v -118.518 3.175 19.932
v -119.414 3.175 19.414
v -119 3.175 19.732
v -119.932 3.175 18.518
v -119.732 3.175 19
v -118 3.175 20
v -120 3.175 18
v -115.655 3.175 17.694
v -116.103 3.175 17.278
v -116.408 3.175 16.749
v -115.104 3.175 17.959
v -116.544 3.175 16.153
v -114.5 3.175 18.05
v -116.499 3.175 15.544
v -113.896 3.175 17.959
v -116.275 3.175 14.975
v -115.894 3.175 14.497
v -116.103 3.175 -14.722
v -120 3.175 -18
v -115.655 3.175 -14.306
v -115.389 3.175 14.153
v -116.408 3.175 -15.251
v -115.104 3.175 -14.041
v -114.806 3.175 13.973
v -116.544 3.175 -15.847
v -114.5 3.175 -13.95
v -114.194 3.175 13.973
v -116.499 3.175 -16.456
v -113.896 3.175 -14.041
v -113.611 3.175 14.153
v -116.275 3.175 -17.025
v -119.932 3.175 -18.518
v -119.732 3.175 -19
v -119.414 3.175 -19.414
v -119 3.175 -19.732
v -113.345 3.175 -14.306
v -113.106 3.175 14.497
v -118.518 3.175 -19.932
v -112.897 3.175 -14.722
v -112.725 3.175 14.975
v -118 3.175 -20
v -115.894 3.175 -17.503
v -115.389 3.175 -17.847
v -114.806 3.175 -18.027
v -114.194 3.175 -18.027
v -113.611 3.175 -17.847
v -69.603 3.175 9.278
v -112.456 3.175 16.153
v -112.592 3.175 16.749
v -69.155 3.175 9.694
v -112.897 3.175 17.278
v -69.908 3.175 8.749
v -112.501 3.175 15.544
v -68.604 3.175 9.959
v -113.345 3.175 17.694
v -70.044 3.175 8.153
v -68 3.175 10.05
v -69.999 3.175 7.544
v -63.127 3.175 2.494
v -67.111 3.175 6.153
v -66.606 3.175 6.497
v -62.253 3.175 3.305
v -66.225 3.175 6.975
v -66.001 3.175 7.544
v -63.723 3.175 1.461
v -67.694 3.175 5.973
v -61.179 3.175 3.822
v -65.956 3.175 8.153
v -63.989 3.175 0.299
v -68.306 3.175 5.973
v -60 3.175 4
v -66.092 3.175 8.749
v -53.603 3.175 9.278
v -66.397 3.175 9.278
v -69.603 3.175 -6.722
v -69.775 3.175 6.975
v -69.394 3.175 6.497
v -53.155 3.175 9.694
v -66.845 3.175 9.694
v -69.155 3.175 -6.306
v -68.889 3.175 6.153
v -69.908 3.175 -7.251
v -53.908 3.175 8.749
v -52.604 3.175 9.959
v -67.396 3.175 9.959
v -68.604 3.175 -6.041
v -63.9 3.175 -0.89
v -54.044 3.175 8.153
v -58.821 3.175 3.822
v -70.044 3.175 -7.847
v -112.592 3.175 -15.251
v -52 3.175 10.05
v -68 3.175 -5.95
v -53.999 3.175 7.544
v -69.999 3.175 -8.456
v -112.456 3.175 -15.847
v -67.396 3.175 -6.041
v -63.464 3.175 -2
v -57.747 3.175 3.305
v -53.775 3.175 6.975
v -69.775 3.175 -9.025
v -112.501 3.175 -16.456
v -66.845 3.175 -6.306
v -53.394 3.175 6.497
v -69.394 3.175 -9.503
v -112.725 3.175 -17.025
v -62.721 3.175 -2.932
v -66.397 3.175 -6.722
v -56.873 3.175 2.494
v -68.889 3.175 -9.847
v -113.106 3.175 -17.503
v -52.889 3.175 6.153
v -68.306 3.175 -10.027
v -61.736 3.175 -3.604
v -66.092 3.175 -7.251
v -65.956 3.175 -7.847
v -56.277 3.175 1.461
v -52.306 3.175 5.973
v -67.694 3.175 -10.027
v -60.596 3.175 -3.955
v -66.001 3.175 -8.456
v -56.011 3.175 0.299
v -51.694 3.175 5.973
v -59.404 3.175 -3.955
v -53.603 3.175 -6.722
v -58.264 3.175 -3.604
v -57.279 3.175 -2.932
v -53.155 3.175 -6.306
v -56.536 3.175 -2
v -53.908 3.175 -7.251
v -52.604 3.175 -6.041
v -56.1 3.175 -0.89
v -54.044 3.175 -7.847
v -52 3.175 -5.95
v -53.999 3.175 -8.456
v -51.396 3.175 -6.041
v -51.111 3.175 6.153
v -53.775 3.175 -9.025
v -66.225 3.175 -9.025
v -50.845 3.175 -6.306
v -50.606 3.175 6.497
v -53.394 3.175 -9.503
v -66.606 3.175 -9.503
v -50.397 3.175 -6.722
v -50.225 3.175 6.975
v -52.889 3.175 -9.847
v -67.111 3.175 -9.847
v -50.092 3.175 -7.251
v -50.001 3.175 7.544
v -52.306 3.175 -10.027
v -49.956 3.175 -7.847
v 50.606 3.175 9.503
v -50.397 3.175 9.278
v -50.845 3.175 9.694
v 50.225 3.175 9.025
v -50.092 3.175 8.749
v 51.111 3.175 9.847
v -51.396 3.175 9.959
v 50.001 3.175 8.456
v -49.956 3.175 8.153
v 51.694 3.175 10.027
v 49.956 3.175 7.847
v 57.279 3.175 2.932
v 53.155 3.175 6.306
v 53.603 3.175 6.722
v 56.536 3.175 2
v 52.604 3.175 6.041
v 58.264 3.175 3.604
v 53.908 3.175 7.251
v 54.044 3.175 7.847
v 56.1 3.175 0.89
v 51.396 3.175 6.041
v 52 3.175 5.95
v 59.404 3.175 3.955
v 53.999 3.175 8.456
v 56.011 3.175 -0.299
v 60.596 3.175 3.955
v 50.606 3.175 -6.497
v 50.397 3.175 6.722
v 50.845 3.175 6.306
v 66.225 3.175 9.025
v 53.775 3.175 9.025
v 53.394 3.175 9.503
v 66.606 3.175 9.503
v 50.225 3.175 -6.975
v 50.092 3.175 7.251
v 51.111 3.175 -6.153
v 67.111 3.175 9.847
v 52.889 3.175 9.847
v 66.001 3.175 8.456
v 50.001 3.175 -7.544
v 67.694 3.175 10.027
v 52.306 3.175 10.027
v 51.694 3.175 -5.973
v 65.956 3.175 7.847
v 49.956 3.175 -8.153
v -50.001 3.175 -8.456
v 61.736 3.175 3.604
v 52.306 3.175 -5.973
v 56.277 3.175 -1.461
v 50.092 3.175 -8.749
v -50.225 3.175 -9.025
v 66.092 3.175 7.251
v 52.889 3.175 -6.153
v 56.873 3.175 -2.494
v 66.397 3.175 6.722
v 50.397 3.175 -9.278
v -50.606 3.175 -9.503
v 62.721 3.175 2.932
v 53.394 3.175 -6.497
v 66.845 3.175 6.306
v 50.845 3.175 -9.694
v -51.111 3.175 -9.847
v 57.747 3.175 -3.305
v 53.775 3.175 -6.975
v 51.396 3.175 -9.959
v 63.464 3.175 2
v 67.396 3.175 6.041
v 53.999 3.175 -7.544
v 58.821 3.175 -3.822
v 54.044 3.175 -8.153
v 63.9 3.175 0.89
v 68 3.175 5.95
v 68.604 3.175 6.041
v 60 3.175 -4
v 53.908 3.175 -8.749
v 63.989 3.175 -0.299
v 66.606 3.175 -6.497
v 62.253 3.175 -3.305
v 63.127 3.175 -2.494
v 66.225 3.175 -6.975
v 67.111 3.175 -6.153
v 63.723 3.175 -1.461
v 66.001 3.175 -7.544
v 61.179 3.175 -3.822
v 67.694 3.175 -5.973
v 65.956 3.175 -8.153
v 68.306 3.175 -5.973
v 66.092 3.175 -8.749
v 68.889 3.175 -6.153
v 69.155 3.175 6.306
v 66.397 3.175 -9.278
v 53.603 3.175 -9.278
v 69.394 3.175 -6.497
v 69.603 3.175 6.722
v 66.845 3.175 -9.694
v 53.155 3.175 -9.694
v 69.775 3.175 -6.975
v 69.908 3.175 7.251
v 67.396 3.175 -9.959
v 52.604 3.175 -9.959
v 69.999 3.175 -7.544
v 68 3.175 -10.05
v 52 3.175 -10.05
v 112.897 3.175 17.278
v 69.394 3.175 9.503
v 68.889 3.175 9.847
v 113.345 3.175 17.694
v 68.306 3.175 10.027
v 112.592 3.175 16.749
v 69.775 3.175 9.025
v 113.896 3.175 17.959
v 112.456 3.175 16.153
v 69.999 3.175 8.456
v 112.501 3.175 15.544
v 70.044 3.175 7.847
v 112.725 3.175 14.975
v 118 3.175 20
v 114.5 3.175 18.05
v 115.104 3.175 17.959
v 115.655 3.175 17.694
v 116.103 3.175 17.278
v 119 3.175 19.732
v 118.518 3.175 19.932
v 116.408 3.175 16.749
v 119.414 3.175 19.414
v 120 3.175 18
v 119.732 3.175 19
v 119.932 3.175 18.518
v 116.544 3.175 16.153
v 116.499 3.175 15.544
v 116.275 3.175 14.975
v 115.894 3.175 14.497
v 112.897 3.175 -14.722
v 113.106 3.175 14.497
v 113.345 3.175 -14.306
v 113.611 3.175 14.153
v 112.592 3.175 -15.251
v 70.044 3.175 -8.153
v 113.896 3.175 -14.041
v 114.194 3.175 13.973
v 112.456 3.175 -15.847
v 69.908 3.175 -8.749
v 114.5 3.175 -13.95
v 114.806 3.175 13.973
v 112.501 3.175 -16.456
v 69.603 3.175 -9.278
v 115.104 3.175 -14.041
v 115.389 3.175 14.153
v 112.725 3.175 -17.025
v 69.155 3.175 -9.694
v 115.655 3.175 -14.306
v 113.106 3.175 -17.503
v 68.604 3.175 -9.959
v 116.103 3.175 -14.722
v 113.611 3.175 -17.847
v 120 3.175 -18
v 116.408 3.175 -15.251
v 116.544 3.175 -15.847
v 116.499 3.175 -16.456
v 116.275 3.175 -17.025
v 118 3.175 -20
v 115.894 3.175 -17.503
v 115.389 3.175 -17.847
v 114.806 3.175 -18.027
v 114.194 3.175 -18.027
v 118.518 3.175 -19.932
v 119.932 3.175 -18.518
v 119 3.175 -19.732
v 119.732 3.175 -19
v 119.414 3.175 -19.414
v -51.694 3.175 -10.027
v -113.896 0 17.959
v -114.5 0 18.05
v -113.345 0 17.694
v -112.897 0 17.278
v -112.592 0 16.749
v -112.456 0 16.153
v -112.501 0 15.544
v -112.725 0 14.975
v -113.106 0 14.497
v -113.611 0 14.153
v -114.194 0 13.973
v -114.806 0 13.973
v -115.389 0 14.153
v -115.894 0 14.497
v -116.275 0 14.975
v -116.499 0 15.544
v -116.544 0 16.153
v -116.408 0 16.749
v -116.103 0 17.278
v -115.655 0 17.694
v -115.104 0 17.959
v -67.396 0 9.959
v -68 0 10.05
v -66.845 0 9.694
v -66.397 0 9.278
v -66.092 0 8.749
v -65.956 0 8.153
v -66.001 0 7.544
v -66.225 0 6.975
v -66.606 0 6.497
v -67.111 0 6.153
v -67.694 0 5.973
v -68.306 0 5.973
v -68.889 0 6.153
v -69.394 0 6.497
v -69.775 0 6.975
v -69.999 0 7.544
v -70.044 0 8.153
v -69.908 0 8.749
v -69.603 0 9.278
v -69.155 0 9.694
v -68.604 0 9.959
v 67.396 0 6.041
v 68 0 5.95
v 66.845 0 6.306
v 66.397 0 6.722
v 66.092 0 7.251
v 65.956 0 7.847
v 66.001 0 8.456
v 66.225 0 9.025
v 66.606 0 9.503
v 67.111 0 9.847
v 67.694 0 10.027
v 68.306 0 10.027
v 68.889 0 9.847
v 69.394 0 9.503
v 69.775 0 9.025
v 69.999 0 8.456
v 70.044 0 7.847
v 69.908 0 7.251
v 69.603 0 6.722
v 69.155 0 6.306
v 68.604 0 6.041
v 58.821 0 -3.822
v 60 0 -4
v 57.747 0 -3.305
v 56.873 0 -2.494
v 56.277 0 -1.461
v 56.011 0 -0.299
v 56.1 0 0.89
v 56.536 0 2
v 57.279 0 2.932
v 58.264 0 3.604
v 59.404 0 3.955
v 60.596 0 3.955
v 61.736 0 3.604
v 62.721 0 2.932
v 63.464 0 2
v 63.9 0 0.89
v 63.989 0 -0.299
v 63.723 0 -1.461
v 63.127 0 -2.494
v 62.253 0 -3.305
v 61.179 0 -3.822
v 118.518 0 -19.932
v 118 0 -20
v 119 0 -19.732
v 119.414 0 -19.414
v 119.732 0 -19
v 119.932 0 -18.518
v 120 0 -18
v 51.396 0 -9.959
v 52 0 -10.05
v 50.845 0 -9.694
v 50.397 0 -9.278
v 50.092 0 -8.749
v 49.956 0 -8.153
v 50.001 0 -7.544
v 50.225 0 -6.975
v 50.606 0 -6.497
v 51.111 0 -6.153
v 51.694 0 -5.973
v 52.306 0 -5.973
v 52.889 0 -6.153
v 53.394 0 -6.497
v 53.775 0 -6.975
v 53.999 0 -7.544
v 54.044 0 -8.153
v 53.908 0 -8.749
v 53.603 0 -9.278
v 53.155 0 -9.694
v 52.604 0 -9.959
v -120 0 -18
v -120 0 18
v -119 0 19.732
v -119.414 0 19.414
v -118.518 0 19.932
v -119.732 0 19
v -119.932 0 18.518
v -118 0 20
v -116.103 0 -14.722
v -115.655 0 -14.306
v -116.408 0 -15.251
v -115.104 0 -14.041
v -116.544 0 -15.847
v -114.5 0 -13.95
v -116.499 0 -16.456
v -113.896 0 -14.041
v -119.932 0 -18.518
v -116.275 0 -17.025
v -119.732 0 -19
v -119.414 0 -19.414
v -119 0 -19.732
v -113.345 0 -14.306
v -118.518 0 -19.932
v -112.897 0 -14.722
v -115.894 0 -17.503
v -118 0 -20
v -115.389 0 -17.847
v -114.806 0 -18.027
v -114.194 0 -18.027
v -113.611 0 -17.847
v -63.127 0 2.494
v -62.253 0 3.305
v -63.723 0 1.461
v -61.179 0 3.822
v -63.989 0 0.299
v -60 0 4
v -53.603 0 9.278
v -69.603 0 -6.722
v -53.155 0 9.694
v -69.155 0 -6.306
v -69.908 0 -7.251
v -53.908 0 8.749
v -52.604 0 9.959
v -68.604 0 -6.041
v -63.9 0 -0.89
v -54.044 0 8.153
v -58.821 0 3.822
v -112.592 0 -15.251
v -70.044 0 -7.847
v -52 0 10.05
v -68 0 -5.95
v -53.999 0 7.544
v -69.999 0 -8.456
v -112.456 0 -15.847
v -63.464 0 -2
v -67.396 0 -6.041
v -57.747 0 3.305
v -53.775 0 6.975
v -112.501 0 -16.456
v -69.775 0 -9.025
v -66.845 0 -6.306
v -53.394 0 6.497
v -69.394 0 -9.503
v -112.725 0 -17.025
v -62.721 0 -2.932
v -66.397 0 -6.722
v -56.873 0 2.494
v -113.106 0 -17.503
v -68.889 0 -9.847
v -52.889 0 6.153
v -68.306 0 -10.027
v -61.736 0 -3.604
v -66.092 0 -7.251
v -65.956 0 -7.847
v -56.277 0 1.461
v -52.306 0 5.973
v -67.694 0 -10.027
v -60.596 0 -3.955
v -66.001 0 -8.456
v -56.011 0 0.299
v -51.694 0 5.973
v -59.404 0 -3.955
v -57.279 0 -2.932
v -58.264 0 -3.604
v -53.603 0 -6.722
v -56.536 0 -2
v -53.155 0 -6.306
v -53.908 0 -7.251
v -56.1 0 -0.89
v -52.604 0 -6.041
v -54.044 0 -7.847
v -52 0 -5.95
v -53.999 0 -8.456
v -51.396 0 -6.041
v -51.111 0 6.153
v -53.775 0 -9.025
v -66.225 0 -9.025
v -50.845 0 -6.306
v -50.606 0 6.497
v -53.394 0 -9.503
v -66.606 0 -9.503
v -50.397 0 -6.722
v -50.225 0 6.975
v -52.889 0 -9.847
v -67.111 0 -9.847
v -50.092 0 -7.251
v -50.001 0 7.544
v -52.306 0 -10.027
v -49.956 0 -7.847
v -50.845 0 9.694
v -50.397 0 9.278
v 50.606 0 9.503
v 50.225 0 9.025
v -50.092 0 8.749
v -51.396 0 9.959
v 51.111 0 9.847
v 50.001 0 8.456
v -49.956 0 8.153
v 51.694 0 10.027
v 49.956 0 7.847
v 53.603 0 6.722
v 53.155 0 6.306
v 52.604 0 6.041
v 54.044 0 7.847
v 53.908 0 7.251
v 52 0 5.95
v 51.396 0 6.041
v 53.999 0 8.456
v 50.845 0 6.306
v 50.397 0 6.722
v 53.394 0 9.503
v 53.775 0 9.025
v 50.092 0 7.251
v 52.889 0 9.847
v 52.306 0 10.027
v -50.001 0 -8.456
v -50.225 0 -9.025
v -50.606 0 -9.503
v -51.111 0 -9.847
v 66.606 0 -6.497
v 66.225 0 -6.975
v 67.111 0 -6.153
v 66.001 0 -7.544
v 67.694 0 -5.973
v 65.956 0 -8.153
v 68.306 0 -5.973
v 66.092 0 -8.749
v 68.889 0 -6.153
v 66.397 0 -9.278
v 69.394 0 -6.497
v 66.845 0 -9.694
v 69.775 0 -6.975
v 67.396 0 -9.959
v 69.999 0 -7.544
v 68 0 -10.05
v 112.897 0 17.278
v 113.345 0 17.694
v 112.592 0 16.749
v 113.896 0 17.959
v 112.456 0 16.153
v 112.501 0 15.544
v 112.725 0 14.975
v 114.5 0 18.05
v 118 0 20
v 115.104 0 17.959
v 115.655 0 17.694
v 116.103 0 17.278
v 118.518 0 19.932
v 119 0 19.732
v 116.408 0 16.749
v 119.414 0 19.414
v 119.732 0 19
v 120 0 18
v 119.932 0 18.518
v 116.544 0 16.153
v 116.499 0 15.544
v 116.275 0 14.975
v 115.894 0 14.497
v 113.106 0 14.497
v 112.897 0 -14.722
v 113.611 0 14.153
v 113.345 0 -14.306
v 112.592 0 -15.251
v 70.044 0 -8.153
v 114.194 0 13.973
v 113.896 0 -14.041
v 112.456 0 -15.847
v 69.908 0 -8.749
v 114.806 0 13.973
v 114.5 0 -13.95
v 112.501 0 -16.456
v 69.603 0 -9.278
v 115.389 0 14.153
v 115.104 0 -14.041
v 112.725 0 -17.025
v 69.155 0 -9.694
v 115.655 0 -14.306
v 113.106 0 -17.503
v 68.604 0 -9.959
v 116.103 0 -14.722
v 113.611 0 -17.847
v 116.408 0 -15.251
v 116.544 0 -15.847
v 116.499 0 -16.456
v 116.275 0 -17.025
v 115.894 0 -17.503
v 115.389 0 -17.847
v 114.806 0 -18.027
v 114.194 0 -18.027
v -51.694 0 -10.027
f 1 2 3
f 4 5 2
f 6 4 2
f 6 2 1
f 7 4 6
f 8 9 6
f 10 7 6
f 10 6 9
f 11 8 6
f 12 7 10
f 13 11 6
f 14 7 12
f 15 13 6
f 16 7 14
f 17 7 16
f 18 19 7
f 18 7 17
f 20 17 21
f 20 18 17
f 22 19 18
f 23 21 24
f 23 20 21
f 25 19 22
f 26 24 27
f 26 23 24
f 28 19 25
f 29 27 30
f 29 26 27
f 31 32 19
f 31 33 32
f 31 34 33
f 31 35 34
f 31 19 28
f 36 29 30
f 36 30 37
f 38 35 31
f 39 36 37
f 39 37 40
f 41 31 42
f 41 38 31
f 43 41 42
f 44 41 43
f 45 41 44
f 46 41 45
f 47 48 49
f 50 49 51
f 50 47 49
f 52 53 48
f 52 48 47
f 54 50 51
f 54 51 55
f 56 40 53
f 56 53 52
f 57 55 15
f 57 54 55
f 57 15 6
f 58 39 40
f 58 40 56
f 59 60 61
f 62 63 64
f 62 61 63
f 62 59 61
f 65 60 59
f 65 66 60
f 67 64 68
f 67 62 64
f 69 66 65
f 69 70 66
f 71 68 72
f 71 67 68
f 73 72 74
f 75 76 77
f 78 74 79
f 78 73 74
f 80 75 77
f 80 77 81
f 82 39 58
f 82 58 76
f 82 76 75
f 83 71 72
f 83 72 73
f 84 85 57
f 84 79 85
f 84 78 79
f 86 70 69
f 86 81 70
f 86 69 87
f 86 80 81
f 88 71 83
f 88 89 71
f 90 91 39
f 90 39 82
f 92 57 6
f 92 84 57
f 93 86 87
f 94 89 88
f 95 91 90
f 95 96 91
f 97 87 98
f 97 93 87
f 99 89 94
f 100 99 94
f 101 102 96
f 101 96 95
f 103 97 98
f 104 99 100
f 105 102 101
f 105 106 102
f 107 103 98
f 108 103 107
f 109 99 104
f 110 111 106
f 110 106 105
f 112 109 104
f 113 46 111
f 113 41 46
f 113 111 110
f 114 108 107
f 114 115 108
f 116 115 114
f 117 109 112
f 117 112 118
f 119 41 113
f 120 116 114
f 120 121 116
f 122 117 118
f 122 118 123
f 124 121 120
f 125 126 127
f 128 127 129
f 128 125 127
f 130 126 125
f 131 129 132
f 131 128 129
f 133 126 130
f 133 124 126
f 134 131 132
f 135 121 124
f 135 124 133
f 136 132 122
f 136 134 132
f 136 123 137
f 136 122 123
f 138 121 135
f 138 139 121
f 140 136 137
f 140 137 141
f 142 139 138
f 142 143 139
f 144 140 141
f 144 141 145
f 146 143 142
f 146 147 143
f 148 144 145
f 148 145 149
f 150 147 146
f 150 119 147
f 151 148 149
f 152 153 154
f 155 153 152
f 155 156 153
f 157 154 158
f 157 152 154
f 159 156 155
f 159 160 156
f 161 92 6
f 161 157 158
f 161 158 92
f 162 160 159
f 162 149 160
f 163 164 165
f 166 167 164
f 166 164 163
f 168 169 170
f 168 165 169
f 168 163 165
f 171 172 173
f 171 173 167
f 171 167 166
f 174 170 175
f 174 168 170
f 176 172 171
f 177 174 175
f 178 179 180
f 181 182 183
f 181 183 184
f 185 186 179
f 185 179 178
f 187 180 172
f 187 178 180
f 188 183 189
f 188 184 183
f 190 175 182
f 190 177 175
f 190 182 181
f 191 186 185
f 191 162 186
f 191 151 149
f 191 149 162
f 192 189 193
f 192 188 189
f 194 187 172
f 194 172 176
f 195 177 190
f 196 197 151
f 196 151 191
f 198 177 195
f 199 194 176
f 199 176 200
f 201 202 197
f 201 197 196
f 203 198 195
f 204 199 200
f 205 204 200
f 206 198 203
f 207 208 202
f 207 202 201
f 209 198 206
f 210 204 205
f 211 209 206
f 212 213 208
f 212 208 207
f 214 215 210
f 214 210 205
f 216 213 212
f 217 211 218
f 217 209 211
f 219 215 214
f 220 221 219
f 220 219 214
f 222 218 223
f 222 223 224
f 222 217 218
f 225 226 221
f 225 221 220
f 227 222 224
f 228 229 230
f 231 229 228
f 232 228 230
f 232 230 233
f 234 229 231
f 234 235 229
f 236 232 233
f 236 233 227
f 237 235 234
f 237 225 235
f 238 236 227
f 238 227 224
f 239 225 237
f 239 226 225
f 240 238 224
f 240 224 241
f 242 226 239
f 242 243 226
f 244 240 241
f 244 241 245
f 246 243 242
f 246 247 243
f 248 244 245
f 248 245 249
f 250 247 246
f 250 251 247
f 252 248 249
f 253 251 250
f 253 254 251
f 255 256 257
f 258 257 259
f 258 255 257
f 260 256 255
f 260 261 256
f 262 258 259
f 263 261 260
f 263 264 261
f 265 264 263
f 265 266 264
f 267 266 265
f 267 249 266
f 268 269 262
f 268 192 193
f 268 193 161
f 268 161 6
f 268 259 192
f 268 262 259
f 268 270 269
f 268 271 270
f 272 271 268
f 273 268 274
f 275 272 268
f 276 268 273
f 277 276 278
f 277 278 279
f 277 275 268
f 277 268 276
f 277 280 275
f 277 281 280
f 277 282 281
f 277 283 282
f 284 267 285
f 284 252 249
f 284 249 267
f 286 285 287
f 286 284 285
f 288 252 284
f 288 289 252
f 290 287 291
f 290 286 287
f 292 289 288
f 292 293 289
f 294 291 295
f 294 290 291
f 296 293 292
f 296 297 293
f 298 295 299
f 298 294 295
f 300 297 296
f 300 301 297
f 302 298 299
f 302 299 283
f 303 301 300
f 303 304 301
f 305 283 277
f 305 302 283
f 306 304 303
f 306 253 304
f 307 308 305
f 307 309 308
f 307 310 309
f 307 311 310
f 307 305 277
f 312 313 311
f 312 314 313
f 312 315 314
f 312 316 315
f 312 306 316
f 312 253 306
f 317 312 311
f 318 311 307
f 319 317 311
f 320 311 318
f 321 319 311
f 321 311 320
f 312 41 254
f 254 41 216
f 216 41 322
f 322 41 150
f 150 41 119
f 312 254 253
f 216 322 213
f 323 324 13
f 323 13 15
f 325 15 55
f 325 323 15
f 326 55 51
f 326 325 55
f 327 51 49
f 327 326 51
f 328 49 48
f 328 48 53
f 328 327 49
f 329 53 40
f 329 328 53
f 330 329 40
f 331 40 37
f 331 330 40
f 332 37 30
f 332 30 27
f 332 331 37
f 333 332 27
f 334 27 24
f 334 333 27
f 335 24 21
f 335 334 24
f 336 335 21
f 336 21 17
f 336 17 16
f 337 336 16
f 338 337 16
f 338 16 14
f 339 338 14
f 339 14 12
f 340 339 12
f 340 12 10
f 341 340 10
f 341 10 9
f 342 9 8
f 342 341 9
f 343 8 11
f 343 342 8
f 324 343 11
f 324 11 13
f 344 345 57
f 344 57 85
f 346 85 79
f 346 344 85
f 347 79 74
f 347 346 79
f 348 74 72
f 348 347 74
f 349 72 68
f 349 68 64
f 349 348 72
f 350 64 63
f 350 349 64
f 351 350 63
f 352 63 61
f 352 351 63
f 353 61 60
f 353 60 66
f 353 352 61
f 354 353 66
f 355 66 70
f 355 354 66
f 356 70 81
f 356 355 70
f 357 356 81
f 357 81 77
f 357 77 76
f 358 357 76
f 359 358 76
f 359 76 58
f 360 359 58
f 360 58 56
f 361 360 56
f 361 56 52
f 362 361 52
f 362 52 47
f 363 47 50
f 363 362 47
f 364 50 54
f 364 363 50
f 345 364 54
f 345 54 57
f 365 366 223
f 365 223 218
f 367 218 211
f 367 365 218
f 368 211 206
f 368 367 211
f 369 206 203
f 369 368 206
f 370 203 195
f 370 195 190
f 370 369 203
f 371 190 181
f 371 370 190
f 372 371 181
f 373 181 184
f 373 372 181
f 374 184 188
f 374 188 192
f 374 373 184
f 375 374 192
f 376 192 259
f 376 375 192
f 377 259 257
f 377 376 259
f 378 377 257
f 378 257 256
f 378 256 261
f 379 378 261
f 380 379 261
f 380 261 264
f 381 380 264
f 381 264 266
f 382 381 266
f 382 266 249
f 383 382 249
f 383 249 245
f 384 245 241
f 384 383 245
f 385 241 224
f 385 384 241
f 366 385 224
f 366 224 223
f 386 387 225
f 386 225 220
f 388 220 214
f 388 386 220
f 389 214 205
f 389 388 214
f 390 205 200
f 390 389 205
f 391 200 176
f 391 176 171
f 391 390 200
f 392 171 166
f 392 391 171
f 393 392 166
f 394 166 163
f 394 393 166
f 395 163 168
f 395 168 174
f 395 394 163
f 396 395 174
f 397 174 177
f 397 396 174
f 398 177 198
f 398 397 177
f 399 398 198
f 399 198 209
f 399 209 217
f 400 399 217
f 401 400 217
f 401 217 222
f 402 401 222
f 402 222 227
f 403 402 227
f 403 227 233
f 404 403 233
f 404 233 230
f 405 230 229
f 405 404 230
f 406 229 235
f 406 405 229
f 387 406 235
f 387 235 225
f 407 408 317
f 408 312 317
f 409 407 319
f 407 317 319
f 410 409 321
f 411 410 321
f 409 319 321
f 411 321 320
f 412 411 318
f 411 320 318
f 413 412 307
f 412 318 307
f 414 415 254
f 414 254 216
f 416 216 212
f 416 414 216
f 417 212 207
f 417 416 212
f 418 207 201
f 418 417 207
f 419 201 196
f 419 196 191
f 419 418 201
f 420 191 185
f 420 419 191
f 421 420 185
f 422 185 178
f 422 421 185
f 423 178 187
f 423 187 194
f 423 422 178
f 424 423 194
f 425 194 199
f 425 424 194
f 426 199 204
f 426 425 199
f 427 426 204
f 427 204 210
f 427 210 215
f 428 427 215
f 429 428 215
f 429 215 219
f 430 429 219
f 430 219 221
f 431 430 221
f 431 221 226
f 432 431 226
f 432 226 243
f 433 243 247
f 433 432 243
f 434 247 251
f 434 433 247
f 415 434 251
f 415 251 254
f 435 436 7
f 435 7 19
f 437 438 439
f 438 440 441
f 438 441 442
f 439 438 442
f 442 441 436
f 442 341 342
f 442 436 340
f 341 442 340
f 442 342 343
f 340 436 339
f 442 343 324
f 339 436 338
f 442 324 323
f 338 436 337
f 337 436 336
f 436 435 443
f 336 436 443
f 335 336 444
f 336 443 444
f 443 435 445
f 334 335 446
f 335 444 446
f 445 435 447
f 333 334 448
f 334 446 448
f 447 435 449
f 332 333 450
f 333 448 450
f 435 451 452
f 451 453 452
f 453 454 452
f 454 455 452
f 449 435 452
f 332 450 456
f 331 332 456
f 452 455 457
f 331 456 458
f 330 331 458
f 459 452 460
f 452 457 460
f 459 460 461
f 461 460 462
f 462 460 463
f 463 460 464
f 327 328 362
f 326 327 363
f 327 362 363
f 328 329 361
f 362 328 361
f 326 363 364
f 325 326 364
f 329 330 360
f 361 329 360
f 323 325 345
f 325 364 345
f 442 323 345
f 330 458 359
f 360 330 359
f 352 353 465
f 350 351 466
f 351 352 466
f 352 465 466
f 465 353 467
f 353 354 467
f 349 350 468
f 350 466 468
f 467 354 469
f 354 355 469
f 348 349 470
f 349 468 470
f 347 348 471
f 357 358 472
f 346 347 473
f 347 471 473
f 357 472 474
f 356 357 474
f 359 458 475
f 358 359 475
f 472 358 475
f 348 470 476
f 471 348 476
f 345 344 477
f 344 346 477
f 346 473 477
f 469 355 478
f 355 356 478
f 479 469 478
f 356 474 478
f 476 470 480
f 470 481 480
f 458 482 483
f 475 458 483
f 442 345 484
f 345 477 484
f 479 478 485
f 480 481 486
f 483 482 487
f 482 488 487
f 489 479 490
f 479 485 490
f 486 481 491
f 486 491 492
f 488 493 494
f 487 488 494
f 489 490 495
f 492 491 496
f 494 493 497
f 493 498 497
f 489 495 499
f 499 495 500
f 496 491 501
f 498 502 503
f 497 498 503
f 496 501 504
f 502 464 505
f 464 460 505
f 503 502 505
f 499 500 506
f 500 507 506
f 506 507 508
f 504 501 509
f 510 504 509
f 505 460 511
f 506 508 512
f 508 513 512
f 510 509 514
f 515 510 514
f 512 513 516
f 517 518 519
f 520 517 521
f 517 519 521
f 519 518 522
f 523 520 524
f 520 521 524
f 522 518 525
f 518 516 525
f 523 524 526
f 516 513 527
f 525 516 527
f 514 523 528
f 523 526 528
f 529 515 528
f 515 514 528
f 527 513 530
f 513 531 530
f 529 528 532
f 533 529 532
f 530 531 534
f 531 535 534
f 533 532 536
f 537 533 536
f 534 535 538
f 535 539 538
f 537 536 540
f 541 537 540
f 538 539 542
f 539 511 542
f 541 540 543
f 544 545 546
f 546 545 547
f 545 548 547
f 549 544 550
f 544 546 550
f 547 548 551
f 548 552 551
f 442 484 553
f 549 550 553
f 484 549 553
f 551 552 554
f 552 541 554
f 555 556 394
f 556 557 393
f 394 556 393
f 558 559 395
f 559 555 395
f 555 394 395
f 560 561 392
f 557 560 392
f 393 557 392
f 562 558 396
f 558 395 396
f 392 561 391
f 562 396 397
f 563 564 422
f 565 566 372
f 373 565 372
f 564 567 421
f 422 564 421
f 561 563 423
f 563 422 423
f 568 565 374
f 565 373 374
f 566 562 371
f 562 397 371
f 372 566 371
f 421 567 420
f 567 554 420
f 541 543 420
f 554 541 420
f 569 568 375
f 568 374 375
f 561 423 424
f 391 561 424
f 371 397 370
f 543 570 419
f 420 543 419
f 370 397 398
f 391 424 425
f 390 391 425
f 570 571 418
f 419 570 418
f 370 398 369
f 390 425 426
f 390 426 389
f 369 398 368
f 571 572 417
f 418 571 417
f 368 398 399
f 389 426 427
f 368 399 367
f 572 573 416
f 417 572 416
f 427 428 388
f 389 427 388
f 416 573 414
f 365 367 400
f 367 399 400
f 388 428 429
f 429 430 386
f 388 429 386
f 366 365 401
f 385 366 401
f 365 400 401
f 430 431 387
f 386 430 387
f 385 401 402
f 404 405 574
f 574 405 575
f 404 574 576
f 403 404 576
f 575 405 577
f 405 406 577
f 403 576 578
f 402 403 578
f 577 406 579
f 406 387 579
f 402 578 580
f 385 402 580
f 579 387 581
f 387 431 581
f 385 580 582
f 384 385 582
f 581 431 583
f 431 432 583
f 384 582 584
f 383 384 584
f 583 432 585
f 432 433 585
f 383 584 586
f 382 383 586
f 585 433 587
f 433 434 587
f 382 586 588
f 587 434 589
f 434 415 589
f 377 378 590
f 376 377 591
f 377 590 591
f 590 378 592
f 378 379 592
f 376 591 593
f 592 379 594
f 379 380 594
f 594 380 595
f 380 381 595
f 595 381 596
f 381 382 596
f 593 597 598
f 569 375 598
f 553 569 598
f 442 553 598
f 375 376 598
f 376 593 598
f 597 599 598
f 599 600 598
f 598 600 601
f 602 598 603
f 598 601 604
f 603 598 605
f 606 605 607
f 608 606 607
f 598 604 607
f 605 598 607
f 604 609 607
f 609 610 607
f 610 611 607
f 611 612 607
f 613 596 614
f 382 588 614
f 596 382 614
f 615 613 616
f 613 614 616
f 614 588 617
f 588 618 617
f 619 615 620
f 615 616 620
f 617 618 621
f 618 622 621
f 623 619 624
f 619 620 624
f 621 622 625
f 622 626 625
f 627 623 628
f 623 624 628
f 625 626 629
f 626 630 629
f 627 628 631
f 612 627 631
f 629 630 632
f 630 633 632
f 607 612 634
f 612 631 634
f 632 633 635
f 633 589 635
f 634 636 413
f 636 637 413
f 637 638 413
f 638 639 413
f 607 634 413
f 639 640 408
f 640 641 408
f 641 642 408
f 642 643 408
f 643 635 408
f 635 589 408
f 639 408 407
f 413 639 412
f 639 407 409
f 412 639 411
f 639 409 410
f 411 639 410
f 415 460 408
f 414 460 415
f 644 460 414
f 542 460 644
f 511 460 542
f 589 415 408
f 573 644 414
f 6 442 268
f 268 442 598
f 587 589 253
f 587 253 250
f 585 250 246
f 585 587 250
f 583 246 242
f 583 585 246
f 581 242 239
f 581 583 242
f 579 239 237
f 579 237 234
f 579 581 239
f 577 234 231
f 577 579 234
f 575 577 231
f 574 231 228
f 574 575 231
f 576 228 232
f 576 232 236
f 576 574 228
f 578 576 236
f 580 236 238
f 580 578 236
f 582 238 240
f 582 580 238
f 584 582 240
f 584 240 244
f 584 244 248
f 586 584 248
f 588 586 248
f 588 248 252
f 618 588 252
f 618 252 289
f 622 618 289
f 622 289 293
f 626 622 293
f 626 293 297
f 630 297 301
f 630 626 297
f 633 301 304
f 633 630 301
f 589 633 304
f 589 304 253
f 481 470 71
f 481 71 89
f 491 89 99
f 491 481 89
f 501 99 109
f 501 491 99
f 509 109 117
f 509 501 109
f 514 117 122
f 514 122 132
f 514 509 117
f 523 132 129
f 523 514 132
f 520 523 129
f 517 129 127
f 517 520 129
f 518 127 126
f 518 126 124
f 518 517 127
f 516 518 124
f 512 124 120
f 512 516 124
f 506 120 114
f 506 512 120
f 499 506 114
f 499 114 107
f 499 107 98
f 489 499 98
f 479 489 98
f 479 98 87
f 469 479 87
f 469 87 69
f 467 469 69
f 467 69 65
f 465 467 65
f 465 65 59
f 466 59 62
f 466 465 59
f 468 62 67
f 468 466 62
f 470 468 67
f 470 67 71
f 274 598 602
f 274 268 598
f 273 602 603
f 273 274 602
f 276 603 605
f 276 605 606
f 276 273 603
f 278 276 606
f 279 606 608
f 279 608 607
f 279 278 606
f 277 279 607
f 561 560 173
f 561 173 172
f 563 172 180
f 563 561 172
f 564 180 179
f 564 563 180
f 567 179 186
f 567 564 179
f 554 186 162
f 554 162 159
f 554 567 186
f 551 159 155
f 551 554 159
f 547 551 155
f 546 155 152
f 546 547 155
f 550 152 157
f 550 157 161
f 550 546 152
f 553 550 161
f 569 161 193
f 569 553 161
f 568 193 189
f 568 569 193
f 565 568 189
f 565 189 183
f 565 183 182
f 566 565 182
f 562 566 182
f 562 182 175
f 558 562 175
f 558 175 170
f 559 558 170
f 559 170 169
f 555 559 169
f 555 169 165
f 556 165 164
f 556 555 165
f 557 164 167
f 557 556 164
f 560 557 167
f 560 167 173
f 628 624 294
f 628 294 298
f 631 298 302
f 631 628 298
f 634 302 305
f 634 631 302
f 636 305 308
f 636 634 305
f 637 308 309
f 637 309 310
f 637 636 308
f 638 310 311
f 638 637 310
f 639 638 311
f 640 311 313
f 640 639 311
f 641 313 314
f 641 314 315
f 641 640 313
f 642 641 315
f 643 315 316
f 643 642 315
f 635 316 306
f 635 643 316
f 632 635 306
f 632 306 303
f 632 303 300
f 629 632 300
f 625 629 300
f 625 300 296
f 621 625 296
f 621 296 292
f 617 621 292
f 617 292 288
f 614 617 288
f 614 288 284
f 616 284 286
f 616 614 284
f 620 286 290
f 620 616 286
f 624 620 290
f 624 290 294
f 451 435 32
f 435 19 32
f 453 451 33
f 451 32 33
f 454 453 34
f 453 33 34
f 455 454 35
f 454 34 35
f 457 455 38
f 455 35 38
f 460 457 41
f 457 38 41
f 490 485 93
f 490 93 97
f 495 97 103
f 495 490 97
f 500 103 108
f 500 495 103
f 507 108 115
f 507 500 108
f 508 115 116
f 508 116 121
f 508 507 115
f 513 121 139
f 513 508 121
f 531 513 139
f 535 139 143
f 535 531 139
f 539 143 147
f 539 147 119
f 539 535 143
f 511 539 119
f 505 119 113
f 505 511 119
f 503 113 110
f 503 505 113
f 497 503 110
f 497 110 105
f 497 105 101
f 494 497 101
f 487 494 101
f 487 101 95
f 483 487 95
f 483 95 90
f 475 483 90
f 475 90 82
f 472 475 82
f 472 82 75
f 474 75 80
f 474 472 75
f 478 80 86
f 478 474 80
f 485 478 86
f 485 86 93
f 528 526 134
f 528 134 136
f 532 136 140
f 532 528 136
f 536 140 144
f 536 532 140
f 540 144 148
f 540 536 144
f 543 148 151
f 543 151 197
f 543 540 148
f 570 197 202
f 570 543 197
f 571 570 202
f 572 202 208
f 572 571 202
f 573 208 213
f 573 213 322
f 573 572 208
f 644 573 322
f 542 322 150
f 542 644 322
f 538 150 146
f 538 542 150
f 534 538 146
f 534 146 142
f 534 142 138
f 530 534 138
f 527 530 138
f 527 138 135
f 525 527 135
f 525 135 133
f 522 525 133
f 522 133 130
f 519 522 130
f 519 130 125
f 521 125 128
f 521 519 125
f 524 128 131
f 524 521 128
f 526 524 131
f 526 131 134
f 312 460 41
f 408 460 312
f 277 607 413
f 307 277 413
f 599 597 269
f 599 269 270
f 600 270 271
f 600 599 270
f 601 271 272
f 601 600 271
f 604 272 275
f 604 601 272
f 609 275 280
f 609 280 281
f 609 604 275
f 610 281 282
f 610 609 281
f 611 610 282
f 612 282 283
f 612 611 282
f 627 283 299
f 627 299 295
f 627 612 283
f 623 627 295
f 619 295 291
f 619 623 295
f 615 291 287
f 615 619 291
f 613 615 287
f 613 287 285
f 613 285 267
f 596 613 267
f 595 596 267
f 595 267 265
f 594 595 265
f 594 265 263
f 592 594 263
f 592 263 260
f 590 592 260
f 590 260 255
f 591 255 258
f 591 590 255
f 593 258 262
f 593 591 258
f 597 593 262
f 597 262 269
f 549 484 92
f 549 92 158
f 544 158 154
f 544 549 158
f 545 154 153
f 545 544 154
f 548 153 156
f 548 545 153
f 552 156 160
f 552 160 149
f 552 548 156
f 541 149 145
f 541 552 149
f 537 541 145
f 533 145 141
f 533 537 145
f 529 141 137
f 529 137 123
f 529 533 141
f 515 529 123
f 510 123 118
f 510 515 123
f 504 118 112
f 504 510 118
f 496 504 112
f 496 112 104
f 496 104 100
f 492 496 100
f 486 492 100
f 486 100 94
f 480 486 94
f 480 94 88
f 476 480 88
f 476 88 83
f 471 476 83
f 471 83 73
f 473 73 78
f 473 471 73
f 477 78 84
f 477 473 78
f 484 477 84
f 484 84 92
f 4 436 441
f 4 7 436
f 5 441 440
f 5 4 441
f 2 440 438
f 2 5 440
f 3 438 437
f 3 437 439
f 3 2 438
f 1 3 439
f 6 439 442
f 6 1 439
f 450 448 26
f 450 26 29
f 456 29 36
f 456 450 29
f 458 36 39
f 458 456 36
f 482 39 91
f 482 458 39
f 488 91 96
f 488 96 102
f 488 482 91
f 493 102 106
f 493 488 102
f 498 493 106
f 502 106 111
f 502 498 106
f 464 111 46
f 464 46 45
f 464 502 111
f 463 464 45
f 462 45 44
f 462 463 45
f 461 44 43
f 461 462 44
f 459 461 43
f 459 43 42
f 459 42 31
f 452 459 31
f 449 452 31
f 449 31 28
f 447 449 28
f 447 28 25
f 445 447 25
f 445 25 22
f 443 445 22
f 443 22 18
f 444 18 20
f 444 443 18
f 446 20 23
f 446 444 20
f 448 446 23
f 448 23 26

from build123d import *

# Parameters (mm, degrees)
SKETCH1_W           = 240
SKETCH1_H           = 40
SKETCH1_R           = 2.05
SKETCH1_R_2         = 4
BOSS_EXTRUDE1_DEPTH = 3.175
FILLET1_R           = 2


with BuildPart() as part:
    # Sketch1 → Boss-Extrude1 (new body)
    with BuildSketch(Plane(origin=(0, 0, 0), x_dir=(1, 0, 0), z_dir=(0, 1, 0))):
        Rectangle(SKETCH1_W, SKETCH1_H)
        with Locations(Location((114.5, 16, 0), (0, 0, 270))):
            Circle(SKETCH1_R, mode=Mode.SUBTRACT)
        with Locations(Location((114.5, -16, 0), (0, 0, 270))):
            Circle(SKETCH1_R, mode=Mode.SUBTRACT)
        with Locations(Location((-114.5, 16, 0), (0, 0, 270))):
            Circle(SKETCH1_R, mode=Mode.SUBTRACT)
        with Locations(Location((-114.5, -16, 0), (0, 0, 270))):
            Circle(SKETCH1_R, mode=Mode.SUBTRACT)
        with Locations(Location((-52, -8, 0), (0, 0, 270))):
            Circle(SKETCH1_R, mode=Mode.SUBTRACT)
        with Locations(Location((-68, -8, 0), (0, 0, 270))):
            Circle(SKETCH1_R, mode=Mode.SUBTRACT)
        with Locations(Location((-68, 8, 0), (0, 0, 270))):
            Circle(SKETCH1_R, mode=Mode.SUBTRACT)
        with Locations(Location((-52, 8, 0), (0, 0, 270))):
            Circle(SKETCH1_R, mode=Mode.SUBTRACT)
        with Locations(Location((-60, 0, 0), (0, 0, 270))):
            Circle(SKETCH1_R_2, mode=Mode.SUBTRACT)
        with Locations(Location((68, 8, 0), (0, 0, 90))):
            Circle(SKETCH1_R, mode=Mode.SUBTRACT)
        with Locations(Location((52, 8, 0), (0, 0, 90))):
            Circle(SKETCH1_R, mode=Mode.SUBTRACT)
        with Locations(Location((60, 0, 0), (0, 0, 90))):
            Circle(SKETCH1_R_2, mode=Mode.SUBTRACT)
        with Locations(Location((68, -8, 0), (0, 0, 90))):
            Circle(SKETCH1_R, mode=Mode.SUBTRACT)
        with Locations(Location((52, -8, 0), (0, 0, 90))):
            Circle(SKETCH1_R, mode=Mode.SUBTRACT)
    extrude(amount=BOSS_EXTRUDE1_DEPTH)

    # Fillet1
    fillet1_edges = [part.edges().sort_by_distance(p)[0] for p in [
        (120, 1.5875, 20),
        (-120, 1.5875, 20),
        (-120, 1.5875, -20),
        (120, 1.5875, -20),
    ]]
    fillet(fillet1_edges, radius=FILLET1_R)


solid = part.part
